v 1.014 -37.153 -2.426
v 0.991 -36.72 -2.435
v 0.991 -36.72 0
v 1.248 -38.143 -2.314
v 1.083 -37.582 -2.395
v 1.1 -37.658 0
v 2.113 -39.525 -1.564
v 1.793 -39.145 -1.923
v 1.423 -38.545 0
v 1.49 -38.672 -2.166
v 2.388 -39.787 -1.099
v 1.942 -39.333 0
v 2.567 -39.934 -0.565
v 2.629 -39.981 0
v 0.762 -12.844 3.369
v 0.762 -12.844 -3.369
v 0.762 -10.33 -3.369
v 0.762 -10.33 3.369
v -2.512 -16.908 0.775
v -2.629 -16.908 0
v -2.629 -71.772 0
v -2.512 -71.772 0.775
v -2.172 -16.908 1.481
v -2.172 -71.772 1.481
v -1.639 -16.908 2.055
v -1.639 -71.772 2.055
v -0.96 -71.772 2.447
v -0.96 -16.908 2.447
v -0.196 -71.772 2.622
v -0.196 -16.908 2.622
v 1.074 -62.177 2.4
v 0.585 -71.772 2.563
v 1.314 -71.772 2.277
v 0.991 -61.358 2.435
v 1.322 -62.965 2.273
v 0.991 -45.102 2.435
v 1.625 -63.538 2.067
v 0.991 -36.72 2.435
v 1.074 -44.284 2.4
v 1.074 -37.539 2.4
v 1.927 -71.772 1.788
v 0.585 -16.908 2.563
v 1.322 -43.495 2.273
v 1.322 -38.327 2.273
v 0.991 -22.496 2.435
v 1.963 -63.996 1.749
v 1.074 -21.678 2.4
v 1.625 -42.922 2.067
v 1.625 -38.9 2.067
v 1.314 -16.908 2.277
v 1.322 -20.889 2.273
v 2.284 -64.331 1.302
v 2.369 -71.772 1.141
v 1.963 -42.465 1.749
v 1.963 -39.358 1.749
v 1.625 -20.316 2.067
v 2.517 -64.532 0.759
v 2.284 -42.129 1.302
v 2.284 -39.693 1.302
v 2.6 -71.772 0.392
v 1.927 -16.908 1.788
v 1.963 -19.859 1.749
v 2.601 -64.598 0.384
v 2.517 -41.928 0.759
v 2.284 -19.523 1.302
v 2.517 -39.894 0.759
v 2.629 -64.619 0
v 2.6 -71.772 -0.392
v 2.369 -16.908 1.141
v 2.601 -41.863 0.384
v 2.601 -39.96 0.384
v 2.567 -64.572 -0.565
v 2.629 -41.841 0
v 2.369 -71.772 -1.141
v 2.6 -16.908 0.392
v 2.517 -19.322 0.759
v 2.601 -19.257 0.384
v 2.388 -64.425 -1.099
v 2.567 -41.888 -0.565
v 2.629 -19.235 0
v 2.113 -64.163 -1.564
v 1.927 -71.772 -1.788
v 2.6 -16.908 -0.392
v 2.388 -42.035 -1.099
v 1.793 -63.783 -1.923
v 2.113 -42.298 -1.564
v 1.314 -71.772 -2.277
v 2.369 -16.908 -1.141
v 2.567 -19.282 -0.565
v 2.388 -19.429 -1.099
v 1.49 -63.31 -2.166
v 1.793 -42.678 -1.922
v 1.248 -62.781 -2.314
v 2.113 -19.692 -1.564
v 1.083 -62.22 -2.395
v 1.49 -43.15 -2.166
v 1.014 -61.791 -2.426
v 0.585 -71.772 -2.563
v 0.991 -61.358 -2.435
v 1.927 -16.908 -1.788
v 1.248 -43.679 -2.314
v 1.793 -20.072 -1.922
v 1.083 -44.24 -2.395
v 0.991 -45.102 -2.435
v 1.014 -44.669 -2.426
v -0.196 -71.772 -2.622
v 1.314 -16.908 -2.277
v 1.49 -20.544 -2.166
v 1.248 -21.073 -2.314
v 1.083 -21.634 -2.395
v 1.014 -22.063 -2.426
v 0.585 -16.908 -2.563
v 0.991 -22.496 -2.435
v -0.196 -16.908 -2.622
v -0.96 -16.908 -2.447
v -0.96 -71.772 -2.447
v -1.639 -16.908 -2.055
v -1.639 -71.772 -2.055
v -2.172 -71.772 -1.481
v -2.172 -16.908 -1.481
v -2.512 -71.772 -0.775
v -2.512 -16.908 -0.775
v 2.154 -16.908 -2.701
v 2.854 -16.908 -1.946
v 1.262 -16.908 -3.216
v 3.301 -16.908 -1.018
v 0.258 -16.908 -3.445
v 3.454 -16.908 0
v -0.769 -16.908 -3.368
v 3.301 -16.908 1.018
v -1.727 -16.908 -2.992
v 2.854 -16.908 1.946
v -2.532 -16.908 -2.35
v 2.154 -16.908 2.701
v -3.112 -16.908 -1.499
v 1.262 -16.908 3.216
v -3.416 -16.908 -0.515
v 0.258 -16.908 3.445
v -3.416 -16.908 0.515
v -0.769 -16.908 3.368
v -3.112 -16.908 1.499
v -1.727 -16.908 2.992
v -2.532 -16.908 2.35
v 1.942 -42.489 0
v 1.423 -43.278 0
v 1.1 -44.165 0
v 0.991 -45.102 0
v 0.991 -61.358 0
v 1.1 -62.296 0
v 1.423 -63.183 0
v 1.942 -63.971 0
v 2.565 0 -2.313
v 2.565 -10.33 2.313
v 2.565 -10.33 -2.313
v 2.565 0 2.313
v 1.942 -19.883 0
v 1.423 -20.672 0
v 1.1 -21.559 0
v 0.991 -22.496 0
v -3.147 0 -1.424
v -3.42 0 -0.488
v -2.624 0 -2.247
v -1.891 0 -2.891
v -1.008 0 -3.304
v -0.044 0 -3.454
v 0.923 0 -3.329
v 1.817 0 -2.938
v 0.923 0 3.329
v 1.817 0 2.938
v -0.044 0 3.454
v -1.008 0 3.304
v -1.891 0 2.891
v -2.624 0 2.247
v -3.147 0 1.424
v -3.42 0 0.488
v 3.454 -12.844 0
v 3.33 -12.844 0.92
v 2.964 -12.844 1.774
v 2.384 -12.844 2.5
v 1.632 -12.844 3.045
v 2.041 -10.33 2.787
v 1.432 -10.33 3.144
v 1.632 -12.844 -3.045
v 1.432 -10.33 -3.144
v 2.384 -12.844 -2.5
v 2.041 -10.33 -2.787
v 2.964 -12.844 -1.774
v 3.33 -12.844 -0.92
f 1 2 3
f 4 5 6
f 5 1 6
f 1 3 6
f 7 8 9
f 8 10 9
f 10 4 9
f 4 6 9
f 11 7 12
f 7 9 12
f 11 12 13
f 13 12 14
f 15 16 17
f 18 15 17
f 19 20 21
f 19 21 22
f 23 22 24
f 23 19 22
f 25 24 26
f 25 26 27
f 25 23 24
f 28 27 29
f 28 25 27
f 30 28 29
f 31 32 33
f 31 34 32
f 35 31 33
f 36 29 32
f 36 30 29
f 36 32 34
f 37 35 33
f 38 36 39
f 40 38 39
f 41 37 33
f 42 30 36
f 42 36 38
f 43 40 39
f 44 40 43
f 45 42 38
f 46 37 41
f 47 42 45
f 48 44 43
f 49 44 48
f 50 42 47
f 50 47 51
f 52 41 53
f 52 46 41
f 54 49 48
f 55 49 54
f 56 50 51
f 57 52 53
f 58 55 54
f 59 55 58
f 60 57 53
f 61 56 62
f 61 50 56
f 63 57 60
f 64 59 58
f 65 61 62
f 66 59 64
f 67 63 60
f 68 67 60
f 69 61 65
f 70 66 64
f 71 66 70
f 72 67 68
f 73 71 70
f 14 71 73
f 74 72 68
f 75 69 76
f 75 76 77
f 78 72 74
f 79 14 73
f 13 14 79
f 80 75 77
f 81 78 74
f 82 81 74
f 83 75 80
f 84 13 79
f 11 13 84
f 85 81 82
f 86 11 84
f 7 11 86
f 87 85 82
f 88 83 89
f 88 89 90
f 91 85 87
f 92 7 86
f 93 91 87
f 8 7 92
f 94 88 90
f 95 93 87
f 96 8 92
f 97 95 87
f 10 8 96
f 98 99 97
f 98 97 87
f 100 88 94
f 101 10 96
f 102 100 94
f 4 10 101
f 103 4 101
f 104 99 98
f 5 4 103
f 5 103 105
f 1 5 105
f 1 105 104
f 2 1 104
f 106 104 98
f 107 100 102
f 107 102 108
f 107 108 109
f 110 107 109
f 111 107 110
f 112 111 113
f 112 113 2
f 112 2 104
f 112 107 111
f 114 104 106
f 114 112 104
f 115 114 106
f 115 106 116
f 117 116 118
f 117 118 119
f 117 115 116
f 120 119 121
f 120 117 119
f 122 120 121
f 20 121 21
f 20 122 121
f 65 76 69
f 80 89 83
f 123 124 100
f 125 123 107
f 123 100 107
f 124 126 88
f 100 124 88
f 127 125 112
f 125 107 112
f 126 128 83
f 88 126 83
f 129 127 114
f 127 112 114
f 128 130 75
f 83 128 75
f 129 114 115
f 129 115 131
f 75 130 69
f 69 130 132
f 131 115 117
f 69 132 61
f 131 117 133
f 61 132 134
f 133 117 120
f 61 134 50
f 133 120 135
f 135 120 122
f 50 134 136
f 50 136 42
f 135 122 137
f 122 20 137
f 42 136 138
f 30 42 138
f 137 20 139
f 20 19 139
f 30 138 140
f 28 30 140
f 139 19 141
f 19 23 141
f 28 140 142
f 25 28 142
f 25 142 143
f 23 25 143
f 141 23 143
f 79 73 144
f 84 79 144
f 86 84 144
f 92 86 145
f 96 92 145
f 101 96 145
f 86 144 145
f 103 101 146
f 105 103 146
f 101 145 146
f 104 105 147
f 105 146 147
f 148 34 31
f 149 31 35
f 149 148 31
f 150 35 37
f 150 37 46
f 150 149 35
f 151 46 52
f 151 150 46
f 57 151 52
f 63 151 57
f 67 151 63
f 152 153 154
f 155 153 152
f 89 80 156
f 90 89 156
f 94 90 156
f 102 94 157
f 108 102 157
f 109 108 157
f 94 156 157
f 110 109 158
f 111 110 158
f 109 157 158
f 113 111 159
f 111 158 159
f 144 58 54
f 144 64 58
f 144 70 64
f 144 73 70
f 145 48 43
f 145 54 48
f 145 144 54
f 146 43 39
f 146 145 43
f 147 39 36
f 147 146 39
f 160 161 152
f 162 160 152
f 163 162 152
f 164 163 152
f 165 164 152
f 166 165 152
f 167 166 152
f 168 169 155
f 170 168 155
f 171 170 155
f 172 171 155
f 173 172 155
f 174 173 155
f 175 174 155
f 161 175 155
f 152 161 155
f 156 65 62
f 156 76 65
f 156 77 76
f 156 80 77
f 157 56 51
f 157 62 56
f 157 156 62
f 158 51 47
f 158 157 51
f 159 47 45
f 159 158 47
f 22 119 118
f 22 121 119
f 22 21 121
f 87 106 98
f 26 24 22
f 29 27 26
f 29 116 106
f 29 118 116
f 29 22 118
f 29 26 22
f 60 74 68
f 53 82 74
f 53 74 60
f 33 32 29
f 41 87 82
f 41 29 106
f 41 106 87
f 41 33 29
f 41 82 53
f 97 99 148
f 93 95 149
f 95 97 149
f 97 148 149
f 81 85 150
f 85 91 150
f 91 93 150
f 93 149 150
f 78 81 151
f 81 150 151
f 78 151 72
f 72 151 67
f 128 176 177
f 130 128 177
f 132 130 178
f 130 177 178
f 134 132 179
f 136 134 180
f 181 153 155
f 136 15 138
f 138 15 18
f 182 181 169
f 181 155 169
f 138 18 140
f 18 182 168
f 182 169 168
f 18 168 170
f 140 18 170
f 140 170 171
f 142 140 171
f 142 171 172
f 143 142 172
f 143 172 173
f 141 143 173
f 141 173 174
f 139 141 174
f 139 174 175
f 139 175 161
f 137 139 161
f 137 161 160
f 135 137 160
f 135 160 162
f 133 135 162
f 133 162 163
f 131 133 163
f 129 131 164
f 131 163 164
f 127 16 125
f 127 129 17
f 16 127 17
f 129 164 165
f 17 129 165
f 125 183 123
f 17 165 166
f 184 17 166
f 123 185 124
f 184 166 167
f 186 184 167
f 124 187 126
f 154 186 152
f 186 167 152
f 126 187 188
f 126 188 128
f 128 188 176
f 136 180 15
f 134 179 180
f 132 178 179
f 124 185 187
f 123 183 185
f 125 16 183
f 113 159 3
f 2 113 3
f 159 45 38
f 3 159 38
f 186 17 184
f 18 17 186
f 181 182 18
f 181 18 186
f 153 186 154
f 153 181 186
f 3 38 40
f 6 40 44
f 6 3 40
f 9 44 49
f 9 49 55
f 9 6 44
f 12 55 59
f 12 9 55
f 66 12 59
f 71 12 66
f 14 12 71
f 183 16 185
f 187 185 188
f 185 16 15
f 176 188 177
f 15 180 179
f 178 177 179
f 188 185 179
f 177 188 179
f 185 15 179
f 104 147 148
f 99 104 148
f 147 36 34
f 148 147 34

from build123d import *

# Parameters (mm, degrees)
F0_R      = 3.4544
F1_DEPTH  = 71.7721196
F3_W      = 4.8468357233
F3_H      = 2.5146
F4_DEPTH  = 39.878
F5_W      = 2.9651967107
F5_H      = 11.1958960486
F6_DEPTH  = 56.642
F8_R      = 3.4544
F8_R_2    = 2.6289
F9_DEPTH  = 58.42
F11_DEPTH = 25.4
F13_DEPTH = 25.4
F15_DEPTH = 25.4


with BuildPart() as f1:
    # F0 (on Front) → F1 (new body)
    with BuildSketch(Plane.XZ):
        Circle(F0_R)
    extrude(amount=F1_DEPTH)

    # F3 (on offset) → F4 (cut)
    with BuildSketch(Plane.XY.offset(25.4)):
        with Locations((3.1854178616, -11.5868196)):
            Rectangle(F3_W, F3_H)
    extrude(amount=-F4_DEPTH, mode=Mode.SUBTRACT)

    # F5 (on offset) → F6 (cut)
    with BuildSketch(Plane.XY.offset(25.4)):
        with Locations((4.0479983554, -5.5979480243)):
            Rectangle(F5_W, F5_H)
    extrude(amount=-F6_DEPTH, mode=Mode.SUBTRACT)

    # F8 (on offset) → F9 (cut)
    with BuildSketch(Plane(origin=(0, -16.9081196, 0), x_dir=(-1, 0, 0), z_dir=(0, 1, 0))):
        Circle(F8_R)
        Circle(F8_R_2, mode=Mode.SUBTRACT)
    extrude(amount=-F9_DEPTH, mode=Mode.SUBTRACT)

    # F10 (on Top) → F11 (cut)
    with BuildSketch(Plane.XY):
        with BuildLine():
            ThreePointArc((5.0546, -41.0381196), (2.1809180413, -42.2284376413), (0.9906, -45.1021196))
            Line((0.9906, -45.1021196), (0.9906, -61.3581196))
            ThreePointArc((0.9906, -61.3581196), (2.1809180413, -64.2318015587), (5.0546, -65.4221196))
            Line((5.0546, -65.4221196), (5.0546, -41.0381196))
        make_face()
        with BuildLine():
            Line((5.0546, -40.7841196), (5.0546, -18.4321196))
            ThreePointArc((5.0546, -18.4321196), (2.1809180413, -19.6224376413), (0.9906, -22.4961196))
            Line((0.9906, -22.4961196), (0.9906, -36.7201196))
            ThreePointArc((0.9906, -36.7201196), (2.1809180413, -39.5938015587), (5.0546, -40.7841196))
        make_face()
    extrude(amount=F11_DEPTH, mode=Mode.SUBTRACT)

    # F12 (on face) → F13 (cut)
    with BuildSketch(Plane.XY):
        with BuildLine():
            ThreePointArc((2.6289, -41.8414332443), (1.4231993887, -43.2775578444), (0.9906, -45.1021196))
            Line((0.9906, -45.1021196), (0.9906, -61.3581196))
            ThreePointArc((0.9906, -61.3581196), (1.4231993887, -63.1826813556), (2.6289, -64.6188059557))
            Line((2.6289, -64.6188059557), (2.6289, -41.8414332443))
        make_face()
    extrude(amount=-F13_DEPTH, mode=Mode.SUBTRACT)

    # F14 (on face) → F15 (cut)
    with BuildSketch(Plane.XY):
        with BuildLine():
            ThreePointArc((2.6289, -19.2354332443), (1.4231993887, -20.6715578444), (0.9906, -22.4961196))
            Line((0.9906, -22.4961196), (0.9906, -36.7201196))
            ThreePointArc((0.9906, -36.7201196), (1.4231993887, -38.5446813556), (2.6289, -39.9808059557))
            Line((2.6289, -39.9808059557), (2.6289, -19.2354332443))
        make_face()
    extrude(amount=-F15_DEPTH, mode=Mode.SUBTRACT)


solid = f1.part
